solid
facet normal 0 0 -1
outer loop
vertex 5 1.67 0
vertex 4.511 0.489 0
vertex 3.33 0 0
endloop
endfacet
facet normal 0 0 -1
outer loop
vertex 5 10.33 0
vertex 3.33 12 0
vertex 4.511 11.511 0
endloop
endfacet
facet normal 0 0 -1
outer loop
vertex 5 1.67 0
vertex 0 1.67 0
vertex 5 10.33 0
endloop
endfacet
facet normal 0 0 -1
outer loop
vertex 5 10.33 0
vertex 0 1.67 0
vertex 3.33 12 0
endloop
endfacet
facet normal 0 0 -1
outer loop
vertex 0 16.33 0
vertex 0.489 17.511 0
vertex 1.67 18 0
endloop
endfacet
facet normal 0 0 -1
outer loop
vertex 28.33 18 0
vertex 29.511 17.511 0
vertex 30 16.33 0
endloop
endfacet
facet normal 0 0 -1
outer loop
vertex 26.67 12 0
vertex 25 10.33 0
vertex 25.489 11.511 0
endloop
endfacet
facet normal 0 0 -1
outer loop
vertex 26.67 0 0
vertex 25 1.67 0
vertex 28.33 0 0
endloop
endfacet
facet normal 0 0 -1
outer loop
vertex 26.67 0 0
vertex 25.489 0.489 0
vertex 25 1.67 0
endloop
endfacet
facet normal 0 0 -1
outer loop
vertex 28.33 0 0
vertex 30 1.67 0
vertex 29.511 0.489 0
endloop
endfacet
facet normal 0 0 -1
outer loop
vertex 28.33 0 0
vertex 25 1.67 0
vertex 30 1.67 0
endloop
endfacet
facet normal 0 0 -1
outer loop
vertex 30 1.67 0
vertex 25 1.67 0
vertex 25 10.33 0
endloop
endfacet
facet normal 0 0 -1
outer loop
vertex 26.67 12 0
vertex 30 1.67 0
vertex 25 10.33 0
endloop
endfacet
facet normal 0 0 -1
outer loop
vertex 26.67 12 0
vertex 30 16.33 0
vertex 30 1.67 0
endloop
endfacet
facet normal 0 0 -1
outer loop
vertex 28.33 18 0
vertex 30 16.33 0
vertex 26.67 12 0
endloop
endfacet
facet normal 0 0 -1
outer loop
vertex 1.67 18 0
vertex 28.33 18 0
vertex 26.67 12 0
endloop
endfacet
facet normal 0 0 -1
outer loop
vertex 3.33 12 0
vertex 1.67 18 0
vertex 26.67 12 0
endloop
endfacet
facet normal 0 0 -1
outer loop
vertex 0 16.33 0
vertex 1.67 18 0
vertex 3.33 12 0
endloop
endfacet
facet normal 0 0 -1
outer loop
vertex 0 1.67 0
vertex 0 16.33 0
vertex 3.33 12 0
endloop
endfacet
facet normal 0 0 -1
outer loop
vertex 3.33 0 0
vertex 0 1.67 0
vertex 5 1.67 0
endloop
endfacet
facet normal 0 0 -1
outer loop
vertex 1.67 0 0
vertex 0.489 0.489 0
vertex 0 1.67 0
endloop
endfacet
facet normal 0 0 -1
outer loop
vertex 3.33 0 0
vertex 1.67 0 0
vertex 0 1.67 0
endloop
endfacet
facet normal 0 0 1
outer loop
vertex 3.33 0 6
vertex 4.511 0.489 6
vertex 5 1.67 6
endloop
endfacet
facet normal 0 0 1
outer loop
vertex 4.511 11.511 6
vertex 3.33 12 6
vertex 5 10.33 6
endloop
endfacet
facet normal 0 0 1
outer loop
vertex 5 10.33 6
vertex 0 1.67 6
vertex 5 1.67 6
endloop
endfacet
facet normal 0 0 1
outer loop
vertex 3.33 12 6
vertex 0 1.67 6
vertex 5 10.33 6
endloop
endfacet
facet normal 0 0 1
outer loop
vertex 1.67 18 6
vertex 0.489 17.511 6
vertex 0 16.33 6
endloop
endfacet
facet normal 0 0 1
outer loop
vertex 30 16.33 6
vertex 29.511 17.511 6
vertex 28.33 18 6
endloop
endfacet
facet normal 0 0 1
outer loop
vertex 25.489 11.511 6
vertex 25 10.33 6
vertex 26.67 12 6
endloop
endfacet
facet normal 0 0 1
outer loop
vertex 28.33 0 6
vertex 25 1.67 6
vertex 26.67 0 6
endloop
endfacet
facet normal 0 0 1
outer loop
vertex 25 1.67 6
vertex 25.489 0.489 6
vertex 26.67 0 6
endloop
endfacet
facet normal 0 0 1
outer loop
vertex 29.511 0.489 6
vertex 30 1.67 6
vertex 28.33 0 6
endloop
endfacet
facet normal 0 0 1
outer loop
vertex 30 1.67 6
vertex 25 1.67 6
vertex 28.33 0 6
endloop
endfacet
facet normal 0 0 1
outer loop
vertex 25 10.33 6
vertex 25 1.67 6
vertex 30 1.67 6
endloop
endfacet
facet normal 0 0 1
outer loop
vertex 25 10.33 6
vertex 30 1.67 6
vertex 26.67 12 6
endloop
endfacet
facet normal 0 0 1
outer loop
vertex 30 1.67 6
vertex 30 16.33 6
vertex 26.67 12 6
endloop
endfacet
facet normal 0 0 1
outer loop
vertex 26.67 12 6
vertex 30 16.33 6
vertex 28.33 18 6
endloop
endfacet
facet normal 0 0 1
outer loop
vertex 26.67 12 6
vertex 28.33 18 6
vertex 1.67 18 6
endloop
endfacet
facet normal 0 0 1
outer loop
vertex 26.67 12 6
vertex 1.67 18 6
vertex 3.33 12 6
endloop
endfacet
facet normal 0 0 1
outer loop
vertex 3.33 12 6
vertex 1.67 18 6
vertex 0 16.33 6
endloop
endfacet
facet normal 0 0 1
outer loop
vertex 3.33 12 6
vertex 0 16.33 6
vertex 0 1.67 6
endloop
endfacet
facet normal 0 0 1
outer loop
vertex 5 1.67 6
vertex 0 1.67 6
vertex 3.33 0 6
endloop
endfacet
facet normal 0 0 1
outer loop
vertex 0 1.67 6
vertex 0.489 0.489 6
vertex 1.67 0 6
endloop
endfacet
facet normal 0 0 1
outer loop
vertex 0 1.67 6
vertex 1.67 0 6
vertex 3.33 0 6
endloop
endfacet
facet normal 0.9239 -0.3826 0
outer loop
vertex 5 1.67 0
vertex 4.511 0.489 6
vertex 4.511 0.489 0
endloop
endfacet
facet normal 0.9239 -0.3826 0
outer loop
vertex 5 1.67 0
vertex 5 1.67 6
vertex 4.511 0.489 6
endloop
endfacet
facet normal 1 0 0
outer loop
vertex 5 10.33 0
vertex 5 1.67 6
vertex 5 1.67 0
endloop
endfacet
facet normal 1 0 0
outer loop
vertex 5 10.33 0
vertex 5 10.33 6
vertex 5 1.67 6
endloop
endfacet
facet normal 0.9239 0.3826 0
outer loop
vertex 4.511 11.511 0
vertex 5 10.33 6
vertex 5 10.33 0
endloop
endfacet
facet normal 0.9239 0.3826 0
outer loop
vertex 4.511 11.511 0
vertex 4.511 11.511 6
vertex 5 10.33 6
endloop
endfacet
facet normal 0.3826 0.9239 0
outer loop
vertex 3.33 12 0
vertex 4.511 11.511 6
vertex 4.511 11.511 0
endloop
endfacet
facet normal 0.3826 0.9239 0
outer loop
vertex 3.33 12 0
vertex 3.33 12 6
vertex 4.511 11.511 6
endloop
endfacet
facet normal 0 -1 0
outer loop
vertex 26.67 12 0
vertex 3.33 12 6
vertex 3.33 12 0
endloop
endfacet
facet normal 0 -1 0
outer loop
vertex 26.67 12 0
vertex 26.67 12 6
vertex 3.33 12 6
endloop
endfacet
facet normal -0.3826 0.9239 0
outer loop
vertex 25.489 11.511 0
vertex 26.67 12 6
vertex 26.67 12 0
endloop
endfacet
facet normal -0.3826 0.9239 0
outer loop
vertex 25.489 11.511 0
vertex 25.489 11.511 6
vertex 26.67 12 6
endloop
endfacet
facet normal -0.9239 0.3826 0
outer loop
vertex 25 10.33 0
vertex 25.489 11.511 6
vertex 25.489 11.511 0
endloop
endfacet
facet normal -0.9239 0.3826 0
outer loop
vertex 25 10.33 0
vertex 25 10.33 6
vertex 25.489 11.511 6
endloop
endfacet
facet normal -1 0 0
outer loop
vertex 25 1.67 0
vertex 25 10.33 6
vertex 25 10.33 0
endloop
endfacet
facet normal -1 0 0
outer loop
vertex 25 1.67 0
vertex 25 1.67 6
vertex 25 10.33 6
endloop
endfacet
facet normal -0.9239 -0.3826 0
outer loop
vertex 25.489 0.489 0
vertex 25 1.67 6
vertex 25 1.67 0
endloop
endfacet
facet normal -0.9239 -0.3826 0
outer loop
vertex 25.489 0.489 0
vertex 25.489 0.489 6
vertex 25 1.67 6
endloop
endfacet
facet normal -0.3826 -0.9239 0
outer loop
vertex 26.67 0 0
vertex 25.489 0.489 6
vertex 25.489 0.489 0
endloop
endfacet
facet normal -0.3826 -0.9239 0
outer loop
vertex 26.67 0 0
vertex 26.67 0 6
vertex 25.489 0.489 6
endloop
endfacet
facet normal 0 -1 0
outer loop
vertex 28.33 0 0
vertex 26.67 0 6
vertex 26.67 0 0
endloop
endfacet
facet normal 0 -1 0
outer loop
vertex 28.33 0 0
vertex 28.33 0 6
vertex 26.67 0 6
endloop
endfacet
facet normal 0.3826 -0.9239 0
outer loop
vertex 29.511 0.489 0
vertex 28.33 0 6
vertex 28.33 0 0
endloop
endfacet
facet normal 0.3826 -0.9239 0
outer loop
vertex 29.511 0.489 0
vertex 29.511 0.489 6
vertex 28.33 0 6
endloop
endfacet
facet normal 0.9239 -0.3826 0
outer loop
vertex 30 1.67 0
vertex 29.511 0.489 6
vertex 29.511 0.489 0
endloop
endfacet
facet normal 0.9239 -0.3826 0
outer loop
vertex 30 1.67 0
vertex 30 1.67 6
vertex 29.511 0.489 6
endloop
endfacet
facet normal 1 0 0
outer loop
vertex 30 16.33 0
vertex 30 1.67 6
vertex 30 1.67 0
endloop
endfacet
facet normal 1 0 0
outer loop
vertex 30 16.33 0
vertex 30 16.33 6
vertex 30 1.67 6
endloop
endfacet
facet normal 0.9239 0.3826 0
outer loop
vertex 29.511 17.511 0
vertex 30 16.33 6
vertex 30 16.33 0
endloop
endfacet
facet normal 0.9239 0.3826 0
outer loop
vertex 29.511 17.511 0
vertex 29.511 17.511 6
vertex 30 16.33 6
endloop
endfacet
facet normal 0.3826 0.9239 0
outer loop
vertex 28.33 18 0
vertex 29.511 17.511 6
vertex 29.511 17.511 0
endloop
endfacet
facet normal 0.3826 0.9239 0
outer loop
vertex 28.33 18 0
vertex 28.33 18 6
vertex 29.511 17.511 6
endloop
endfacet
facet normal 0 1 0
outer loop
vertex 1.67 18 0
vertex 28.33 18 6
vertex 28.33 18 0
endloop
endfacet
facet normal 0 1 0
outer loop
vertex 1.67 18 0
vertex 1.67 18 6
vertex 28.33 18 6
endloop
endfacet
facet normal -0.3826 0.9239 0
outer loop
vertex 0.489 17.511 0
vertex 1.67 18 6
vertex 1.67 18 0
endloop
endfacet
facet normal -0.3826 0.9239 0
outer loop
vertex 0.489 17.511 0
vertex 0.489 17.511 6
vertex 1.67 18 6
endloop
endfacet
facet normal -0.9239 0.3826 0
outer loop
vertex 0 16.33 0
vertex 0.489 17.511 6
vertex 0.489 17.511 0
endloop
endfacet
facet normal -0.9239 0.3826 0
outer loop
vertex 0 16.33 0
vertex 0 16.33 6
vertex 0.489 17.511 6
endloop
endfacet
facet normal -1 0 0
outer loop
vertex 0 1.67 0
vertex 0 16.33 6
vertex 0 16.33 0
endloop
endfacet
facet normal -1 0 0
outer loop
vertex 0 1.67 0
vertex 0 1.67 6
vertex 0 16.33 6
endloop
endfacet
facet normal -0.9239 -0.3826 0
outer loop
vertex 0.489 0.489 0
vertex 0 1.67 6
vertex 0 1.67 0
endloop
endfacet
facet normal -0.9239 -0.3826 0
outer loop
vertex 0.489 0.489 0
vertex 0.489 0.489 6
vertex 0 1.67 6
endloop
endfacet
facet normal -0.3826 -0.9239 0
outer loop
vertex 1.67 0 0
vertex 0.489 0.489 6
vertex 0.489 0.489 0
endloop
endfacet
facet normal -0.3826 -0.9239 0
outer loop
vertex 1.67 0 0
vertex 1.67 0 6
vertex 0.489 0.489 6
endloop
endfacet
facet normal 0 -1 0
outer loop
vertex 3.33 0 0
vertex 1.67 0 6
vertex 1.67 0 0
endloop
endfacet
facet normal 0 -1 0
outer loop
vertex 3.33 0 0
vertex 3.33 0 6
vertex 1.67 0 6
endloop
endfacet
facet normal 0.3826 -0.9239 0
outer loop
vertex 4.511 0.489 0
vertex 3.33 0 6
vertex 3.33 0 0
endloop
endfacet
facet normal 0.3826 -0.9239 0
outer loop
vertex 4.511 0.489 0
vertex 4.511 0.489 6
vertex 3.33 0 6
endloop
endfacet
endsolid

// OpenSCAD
$fn = 32;

// ----------------------------------------------------------------------
// Clip blank: staple clip, 6 mm thick
// ----------------------------------------------------------------------

// --- parameters (mm) ---
profile_height = 6;       // extrusion height
profile_points = 24;      // points of the closed outline

profile = [[0, 1.67], [0.489, 0.489], [1.67, 0], [3.33, 0], [4.511, 0.489], [5, 1.67], [5, 10.33], [4.511, 11.511], [3.33, 12], [26.67, 12], [25.489, 11.511], [25, 10.33], [25, 1.67], [25.489, 0.489], [26.67, 0], [28.33, 0], [29.511, 0.489], [30, 1.67], [30, 16.33], [29.511, 17.511], [28.33, 18], [1.67, 18], [0.489, 17.511], [0, 16.33]];  // single closed polygon, 24 points, counter clockwise

// --- the one profile operation ---
linear_extrude(height = profile_height) polygon(points = profile);
